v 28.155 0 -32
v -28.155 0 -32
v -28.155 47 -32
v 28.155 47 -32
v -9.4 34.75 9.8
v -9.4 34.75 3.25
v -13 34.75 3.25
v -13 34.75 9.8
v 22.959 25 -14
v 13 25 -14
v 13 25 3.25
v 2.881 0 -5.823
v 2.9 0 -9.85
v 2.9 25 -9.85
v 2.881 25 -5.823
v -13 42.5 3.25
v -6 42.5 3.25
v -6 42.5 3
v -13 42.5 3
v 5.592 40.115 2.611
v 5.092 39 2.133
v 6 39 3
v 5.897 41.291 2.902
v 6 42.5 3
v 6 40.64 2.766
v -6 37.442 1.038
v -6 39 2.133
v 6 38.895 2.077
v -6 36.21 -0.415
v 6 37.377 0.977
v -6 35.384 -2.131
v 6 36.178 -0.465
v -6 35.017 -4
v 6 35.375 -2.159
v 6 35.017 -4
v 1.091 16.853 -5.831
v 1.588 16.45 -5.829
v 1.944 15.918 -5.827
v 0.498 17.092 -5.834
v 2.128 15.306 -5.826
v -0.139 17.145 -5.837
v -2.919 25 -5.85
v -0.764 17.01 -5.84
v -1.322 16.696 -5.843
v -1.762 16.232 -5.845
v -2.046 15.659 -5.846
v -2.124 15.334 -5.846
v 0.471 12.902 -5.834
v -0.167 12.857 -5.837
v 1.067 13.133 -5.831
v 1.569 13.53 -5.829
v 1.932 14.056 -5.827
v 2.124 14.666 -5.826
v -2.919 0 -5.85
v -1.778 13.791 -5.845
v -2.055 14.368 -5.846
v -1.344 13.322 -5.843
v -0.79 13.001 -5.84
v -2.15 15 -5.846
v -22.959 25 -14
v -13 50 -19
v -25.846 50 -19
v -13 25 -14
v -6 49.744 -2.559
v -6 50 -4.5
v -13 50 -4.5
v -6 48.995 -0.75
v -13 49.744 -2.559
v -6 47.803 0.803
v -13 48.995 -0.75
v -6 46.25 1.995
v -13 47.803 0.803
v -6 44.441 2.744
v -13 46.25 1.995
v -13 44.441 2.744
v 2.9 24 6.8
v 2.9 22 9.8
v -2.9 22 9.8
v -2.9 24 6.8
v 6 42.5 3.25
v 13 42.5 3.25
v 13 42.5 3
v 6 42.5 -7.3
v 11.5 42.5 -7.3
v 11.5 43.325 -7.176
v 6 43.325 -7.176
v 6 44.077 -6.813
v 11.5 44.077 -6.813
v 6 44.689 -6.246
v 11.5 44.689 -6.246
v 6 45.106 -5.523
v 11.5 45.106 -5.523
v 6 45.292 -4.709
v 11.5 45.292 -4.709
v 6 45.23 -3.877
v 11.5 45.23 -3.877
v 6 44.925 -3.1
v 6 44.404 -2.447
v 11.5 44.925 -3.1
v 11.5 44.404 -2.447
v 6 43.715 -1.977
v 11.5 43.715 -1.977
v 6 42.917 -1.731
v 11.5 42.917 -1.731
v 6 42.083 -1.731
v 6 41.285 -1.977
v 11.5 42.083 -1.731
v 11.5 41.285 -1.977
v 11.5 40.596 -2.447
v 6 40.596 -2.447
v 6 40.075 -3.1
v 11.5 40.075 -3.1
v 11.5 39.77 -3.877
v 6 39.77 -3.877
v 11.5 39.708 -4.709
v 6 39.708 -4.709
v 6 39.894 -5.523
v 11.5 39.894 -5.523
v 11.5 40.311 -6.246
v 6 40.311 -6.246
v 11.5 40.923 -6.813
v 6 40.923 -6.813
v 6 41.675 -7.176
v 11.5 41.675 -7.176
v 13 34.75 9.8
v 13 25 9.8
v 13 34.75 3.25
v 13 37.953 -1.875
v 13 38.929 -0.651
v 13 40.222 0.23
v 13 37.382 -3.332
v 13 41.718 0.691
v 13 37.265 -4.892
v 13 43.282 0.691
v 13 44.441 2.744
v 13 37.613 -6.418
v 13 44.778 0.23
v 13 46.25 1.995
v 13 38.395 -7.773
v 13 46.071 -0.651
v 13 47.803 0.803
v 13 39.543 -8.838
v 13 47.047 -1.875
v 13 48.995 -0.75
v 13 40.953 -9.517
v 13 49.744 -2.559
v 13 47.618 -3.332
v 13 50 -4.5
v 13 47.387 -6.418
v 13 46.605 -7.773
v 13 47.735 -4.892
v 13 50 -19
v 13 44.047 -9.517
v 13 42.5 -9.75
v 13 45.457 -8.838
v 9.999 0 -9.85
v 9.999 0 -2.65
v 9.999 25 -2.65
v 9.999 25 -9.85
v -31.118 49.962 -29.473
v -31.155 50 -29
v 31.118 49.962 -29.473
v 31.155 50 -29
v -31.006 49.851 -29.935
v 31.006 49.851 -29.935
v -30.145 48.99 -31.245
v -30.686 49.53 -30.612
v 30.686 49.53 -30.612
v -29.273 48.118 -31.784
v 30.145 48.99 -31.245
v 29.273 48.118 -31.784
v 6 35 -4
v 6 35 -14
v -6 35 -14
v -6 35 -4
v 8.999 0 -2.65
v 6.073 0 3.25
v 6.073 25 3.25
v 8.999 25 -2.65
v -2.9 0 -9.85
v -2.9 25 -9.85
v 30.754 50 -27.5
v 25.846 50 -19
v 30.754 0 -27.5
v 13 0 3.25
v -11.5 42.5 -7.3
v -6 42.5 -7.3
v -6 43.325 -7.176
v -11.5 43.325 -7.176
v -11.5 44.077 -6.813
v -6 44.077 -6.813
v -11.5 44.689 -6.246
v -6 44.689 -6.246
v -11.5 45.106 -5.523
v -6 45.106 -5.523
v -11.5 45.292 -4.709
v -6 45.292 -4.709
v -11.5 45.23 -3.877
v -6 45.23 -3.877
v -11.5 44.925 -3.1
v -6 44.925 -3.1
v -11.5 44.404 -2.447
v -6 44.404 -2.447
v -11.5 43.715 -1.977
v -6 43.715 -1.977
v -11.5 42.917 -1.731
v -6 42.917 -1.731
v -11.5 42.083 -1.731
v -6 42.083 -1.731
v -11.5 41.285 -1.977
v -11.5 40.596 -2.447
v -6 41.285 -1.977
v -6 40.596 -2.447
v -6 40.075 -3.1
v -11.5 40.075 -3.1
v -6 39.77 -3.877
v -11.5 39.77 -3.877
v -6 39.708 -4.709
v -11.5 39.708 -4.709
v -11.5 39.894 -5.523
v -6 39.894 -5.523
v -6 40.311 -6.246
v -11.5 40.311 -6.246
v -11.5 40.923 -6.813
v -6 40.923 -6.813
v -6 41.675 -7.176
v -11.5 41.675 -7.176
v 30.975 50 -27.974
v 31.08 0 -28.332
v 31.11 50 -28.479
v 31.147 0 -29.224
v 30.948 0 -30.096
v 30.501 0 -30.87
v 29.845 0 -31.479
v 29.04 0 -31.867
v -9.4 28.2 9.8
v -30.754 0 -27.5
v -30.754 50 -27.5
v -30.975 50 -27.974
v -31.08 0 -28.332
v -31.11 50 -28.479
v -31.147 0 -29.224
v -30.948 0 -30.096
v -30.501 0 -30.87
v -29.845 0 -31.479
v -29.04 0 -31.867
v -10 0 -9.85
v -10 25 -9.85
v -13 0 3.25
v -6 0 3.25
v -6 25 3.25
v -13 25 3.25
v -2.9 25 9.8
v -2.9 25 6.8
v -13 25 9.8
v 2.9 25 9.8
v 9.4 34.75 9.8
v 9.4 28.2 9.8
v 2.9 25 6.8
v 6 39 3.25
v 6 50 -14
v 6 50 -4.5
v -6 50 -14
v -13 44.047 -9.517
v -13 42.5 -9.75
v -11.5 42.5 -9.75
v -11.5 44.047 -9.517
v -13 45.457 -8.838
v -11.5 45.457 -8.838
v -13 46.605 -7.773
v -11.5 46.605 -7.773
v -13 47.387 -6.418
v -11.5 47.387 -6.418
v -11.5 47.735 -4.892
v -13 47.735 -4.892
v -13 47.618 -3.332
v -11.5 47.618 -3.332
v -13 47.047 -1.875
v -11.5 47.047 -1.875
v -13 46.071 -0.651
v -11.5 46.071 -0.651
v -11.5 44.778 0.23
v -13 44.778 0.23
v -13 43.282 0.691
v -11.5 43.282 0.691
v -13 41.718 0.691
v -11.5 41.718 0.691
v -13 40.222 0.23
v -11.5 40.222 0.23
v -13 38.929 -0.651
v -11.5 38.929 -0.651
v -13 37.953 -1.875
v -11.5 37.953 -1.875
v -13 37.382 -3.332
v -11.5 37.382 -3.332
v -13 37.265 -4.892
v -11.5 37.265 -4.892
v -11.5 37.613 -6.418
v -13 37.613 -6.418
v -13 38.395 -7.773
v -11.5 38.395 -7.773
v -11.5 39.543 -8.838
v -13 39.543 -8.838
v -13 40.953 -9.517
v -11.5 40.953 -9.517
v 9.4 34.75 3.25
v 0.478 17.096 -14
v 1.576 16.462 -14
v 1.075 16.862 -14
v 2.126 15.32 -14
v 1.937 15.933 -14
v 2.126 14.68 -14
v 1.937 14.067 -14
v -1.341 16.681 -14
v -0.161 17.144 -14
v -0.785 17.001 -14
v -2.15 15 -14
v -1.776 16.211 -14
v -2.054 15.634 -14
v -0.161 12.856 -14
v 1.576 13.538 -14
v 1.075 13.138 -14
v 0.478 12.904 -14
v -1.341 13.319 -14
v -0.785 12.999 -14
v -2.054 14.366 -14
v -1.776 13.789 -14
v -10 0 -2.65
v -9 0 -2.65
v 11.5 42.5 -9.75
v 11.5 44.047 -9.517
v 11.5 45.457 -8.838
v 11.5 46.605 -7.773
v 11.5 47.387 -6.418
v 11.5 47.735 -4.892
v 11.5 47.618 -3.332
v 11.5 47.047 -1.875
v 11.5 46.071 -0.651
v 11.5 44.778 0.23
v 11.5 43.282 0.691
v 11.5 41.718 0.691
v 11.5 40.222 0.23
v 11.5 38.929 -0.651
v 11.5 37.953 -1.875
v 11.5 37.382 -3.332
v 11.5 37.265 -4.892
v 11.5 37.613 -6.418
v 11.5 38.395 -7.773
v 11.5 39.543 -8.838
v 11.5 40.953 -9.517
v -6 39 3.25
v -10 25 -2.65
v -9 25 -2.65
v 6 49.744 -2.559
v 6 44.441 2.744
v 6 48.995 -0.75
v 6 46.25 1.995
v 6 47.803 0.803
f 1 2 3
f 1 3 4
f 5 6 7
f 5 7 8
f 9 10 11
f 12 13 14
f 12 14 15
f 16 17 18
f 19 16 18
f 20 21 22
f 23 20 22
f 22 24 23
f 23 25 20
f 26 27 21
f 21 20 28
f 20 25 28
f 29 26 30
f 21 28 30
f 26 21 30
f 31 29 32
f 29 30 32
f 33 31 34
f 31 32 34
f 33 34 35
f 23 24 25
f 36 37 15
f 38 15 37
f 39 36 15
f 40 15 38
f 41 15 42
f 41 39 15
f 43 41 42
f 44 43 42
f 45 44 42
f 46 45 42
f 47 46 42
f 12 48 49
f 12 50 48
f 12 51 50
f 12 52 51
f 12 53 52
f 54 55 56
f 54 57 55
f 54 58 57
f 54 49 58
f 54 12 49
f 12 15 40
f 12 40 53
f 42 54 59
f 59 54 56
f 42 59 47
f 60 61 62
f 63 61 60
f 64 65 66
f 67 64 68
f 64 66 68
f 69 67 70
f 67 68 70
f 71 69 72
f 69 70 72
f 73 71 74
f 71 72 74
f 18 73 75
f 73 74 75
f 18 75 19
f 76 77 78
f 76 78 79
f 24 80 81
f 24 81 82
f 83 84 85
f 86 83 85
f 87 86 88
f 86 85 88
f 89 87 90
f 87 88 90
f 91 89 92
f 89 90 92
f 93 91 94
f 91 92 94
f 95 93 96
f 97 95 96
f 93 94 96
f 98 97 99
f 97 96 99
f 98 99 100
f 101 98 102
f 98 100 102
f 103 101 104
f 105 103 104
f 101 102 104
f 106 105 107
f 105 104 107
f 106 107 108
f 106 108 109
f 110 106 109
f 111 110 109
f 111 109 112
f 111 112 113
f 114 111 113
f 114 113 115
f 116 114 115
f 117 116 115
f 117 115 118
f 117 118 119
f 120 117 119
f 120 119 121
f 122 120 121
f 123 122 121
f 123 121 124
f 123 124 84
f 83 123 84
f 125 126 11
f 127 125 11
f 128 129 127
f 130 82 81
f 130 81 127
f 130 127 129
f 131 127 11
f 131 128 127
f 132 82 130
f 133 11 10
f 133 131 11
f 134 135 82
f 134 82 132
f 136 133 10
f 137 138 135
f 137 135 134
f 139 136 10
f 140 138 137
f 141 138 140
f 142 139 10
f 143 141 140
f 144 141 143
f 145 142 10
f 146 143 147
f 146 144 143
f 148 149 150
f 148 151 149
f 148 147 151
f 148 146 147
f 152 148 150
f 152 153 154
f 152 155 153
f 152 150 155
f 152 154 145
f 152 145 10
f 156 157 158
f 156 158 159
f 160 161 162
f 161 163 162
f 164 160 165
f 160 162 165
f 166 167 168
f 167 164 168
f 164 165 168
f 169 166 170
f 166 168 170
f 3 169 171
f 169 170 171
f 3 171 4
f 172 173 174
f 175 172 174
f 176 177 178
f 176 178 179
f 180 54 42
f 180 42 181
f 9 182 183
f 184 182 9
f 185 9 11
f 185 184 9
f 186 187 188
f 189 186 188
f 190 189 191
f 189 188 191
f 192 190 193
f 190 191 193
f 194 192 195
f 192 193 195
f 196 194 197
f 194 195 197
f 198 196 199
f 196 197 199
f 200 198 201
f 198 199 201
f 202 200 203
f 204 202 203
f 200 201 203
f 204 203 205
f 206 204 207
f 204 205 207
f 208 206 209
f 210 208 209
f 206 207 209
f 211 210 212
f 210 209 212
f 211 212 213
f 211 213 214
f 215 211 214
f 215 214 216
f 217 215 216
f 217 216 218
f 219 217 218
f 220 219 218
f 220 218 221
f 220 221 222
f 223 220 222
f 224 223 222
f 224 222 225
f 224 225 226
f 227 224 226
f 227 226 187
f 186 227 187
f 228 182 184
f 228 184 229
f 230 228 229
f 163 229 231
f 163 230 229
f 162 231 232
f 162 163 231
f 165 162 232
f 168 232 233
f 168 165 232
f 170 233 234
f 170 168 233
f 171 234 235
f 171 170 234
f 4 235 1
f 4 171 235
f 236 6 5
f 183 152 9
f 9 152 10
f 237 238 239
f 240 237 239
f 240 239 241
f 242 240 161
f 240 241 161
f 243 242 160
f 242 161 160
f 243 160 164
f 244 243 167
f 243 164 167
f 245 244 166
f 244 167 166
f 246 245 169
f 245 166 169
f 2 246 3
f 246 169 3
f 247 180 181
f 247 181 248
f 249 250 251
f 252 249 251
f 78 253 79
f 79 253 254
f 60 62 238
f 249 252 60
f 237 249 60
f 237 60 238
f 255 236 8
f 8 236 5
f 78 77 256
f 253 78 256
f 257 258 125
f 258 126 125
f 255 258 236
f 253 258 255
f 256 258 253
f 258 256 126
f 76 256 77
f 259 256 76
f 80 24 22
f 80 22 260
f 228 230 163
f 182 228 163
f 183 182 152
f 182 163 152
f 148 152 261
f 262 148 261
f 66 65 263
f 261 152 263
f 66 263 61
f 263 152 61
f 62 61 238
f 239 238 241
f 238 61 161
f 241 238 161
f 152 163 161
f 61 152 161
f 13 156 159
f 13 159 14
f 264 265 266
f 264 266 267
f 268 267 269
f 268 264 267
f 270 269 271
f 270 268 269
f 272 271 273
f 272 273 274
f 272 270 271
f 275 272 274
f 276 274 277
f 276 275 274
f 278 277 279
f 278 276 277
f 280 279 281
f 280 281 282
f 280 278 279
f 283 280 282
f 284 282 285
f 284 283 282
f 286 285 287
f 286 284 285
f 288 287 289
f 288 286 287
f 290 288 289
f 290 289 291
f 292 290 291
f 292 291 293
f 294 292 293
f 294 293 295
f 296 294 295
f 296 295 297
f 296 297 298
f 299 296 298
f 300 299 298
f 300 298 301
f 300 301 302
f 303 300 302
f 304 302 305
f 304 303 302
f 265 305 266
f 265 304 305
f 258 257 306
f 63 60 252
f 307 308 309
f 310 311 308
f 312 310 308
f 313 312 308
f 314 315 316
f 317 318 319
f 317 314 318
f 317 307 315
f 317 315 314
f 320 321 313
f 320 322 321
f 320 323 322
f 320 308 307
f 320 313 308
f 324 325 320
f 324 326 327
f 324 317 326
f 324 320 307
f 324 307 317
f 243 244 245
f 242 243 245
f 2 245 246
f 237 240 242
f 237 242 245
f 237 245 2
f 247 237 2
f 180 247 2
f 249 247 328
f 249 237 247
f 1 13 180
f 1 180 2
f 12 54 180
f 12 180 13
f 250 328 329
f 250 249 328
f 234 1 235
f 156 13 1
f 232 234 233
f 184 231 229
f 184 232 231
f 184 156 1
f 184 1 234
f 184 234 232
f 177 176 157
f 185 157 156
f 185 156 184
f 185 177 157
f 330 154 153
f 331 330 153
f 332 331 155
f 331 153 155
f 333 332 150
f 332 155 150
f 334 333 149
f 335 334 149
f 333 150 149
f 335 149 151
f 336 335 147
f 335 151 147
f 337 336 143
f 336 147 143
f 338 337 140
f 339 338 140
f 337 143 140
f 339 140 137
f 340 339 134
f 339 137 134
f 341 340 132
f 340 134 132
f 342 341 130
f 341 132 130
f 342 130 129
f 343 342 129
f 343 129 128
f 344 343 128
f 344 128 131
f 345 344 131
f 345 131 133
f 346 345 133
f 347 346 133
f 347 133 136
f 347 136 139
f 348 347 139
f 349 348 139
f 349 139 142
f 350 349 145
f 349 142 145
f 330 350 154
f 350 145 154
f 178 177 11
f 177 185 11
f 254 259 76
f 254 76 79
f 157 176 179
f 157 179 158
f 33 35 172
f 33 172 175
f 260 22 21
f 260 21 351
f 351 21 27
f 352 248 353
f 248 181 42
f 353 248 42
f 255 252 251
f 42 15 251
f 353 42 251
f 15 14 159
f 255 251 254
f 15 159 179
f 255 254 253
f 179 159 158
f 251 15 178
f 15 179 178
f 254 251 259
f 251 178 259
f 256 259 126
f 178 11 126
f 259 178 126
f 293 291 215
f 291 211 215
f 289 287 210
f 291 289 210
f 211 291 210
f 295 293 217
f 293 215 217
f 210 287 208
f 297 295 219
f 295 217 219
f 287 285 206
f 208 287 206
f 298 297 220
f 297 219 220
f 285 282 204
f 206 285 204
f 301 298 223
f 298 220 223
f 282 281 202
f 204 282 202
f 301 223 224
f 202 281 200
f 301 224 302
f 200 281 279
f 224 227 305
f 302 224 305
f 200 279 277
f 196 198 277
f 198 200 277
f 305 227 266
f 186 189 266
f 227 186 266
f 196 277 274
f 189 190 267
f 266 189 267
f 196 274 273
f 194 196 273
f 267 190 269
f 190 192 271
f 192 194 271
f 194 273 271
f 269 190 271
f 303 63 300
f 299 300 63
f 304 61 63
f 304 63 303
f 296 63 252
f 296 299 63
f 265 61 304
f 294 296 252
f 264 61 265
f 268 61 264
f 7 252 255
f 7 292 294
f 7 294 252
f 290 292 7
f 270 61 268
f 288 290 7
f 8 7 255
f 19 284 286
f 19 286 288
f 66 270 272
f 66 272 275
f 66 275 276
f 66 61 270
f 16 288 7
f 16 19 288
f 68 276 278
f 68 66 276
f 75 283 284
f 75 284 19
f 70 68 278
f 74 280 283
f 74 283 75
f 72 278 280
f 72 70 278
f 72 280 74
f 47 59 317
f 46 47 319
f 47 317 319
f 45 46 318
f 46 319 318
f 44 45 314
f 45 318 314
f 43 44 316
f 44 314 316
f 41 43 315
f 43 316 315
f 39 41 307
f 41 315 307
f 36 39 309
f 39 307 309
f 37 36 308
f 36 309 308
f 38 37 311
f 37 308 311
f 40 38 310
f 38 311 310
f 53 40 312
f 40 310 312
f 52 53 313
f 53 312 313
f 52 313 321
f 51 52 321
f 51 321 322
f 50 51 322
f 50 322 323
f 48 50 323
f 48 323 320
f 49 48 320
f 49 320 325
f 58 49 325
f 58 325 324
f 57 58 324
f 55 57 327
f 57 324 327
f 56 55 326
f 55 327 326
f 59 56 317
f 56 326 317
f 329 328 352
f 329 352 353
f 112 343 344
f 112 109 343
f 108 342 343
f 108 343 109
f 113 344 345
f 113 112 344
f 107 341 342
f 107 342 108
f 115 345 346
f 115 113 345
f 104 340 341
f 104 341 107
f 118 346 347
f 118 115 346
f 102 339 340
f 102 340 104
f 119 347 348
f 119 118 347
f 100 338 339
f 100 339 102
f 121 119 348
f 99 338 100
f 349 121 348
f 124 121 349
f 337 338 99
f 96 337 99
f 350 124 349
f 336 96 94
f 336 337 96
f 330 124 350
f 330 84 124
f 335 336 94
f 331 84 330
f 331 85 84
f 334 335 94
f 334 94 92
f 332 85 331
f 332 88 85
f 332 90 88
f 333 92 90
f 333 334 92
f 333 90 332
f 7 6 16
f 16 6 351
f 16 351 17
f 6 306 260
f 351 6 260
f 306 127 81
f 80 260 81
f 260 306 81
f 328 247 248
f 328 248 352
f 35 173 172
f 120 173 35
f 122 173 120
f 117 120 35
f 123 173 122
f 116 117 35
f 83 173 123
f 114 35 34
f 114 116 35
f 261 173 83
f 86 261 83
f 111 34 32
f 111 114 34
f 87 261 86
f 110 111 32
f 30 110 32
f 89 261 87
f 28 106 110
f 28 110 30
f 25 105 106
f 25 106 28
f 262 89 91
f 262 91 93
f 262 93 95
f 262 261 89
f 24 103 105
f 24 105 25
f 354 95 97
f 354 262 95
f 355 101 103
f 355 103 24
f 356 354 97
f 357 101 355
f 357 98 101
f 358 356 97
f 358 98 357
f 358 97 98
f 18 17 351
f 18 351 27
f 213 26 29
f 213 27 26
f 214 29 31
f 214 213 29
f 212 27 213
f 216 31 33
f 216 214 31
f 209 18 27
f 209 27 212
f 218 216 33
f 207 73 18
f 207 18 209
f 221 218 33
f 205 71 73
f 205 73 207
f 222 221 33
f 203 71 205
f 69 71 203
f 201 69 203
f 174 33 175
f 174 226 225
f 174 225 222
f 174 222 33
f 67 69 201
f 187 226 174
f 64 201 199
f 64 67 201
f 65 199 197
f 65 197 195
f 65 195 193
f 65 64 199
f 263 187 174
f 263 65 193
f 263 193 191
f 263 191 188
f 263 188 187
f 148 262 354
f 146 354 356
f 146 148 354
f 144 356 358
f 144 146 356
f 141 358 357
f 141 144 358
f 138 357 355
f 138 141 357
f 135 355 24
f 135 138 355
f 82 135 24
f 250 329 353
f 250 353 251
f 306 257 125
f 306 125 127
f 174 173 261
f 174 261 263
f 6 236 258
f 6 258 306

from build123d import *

# Parameters (mm, degrees)
BOSS_EXTRUDE1_DEPTH     = 50
CUT_EXTRUDE6_DEPTH      = 25
CUT_EXTRUDE3_DEPTH      = 39.00000000000001
SKETCH14_R              = 7.5000000000001545
BOSS_EXTRUDE7_DEPTH     = 7
SKETCH15_R              = 2.800000000000002
CUT_EXTRUDE4_DEPTH      = 27.999999999999996
SKETCH16_R              = 5.249999999999997
CUT_EXTRUDE5_DEPTH      = 1.5
CUT_EXTRUDE7_DEPTH      = 54.52569476429079
SKETCH19_R              = 2.1499999999999995
CUT_EXTRUDE9_DEPTH      = 50
ENL_V_MAT_EXTRU_1_DEPTH = 7.5
ENL_V_MAT_EXTRU_3_DEPTH = 10
BOSS_EXTRU_1_DEPTH      = 26.00000000000001
ENL_V_MAT_EXTRU_5_DEPTH = 3.5
BOSS_EXTRU_3_DEPTH      = 1
BOSS_EXTRU_4_START      = -5.8
BOSS_EXTRU_4_DEPTH      = 5.8
BOSS_EXTRU_5_DEPTH      = 0.1
BOSS_EXTRU_6_DEPTH      = 0.1
ESQUISSE13_W            = 6.549999999999918
ESQUISSE13_H            = 9.750000000000139
BOSS_EXTRU_7_DEPTH      = 3.6
ESQUISSE14_W            = 6.549999999999992
ESQUISSE14_H            = 9.750000000000139
BOSS_EXTRU_8_DEPTH      = 3.6
BOSS_EXTRU_11_DEPTH     = 25
BOSS_EXTRU_12_DEPTH     = 25
ENL_V_MAT_EXTRU_6_DEPTH = 28.00000000000001
CONG_1_R                = 3


with BuildPart() as part:
    # Sketch1 → Boss-Extrude1 (new body)
    with BuildSketch(Plane(origin=(0, 0, 0), x_dir=(1, 0, 0), z_dir=(0, 1, 0))):
        Polygon((-13.000000000000004, 14), (12.999999999999996, 14), (13.000000000000002, -14), (-12.999999999999998, -14), align=None)
    extrude(amount=BOSS_EXTRUDE1_DEPTH)

    # Sketch3 → Cut-Extrude6 (cut)
    with BuildSketch(Plane(origin=(0, 0, 0), x_dir=(1, 0, 0), z_dir=(0, 1, 0))):
        Polygon((9.998973293230602, 2.6500000000000012), (9.9989732932306, 9.850000000000001), (2.9002540058261537, 9.850000000000001), (2.881158297661572, 5.82281627717582), (-2.9187777922427904, 5.850044075927868), (-2.8999999999999972, 9.850000000000001), (-9.999999999999996, 9.85), (-9.999999999999995, 2.6499999999999995), (-8.99999999999974, 2.6499999999999995), (-6.00000000000001, -3.2500000000000027), (-9.999999999999998, -3.2500000000000027), (-9.999999999999993, -4.349999999999079), (-9.99999999999999, -15.089504782389637), (10.190019105374848, -15.102048820223754), (10.123266065424222, -8.899331206040385), (10.06892160658641, -3.849623622447693), (10.062468515842252, -3.2500000000000027), (6.072889948170096, -3.2500000000000027), (8.998973293230604, 2.6500000000000017), align=None)
    extrude(amount=CUT_EXTRUDE6_DEPTH, mode=Mode.SUBTRACT)

    # Sketch7 → Cut-Extrude3 (cut)
    with BuildSketch(Plane(origin=(13, 0, -2.42e-15), x_dir=(-1.3e-16, 0, -1), z_dir=(1, 0, -1.3e-16))):
        with BuildLine():
            Line((4.499999999999999, 50), (-14.000000000000002, 50))
            Line((-14.000000000000002, 50), (-14.000000000000002, 24.000000000000004))
            Line((-14.000000000000002, 24.000000000000004), (-0.8033008588991847, 37.19669914110098))
            ThreePointArc((-0.8033008588991847, 37.19669914110098), (11.429096493834622, 39.629874257261775), (4.499999999999999, 50))
        make_face()
    extrude(amount=-CUT_EXTRUDE3_DEPTH, mode=Mode.SUBTRACT)

    # Sketch14 → Boss-Extrude7 (add)
    with BuildSketch(Plane(origin=(13, 0, -2.42e-15), x_dir=(-1.3e-16, 0, -1), z_dir=(1, 0, -1.3e-16))):
        with Locations((4.499999999999999, 42.500000000000114)):
            Circle(SKETCH14_R)
    boss_extrude7 = extrude(amount=-BOSS_EXTRUDE7_DEPTH)

    # Symétrie1: Boss-Extrude7 across plane
    add(boss_extrude7.mirror(Plane(origin=(0, 0, 0), x_dir=(0, 0, 1), z_dir=(1, 0, 0))))

    # Sketch15 → Cut-Extrude4 (cut)
    with BuildSketch(Plane(origin=(13, 0, -2.42e-15), x_dir=(-1.3e-16, 0, -1), z_dir=(1, 0, -1.3e-16))):
        with Locations((4.499999999999999, 42.50000000000027)):
            Circle(SKETCH15_R)
    extrude(amount=-CUT_EXTRUDE4_DEPTH, mode=Mode.SUBTRACT)

    # Sketch16 → Cut-Extrude5 (cut)
    with BuildSketch(Plane(origin=(13, 0, -2.42e-15), x_dir=(-1.3e-16, 0, -1), z_dir=(1, 0, -1.3e-16))):
        with Locations((4.499999999999999, 42.50000000000027)):
            Circle(SKETCH16_R)
    cut_extrude5 = extrude(amount=-CUT_EXTRUDE5_DEPTH, mode=Mode.SUBTRACT)

    # Mirror3: Cut-Extrude5 across plane
    add(cut_extrude5.mirror(Plane(origin=(0, 0, 0), x_dir=(0, 0, 1), z_dir=(1, 0, 0))), mode=Mode.SUBTRACT)

    # Sketch17 → Cut-Extrude7 (cut, through all)
    with BuildSketch(Plane.XZ):
        Polygon((-9.29999999999996, 3.250000000000054), (-13.000000000000009, 3.2500000000000546), (-12.999999999999998, 14), (13.000000000000002, 14), (12.99999999999999, 3.2500000000000546), (9.300000000000033, 3.2499999999999205), (9.300000000000033, 9.79999999999992), (-9.29999999999996, 9.80000000000005), align=None)
    extrude(amount=-CUT_EXTRUDE7_DEPTH, mode=Mode.SUBTRACT)

    # Sketch19 → Cut-Extrude9 (cut)
    with BuildSketch(Plane(origin=(0, 0, -14), x_dir=(-1, 0, 0), z_dir=(0, 0, -1))):
        with Locations((0, 15)):
            Circle(SKETCH19_R)
    extrude(amount=-CUT_EXTRUDE9_DEPTH, mode=Mode.SUBTRACT)

    # Esquisse1 → Enlèv. mat.-Extru.1 (cut)
    with BuildSketch(Plane(origin=(0, 50, 0), x_dir=(1, 0, 0), z_dir=(0, 1, 0))):
        Polygon((5.999999999999998, 4.500000000000001), (-6.000000000000002, 4.499999999999999), (-6, 14), (5.999999999999998, 14), align=None)
    extrude(amount=-ENL_V_MAT_EXTRU_1_DEPTH, mode=Mode.SUBTRACT)

    # Esquisse3 → Enlèv. mat.-Extru.3 (cut)
    with BuildSketch(Plane(origin=(0, 0, -14), x_dir=(-1, 0, 0), z_dir=(0, 0, -1))):
        Polygon((6, 42.5), (-6, 42.5), (-5.999999999999999, 35), (6.000000000000001, 35), align=None)
    extrude(amount=-ENL_V_MAT_EXTRU_3_DEPTH, mode=Mode.SUBTRACT)

    # Esquisse6 → Boss.-Extru.1 (add)
    with BuildSketch(Plane(origin=(13, 0, -2.42e-15), x_dir=(-1.9e-16, 0, -1), z_dir=(1, 0, -1.9e-16))):
        with BuildLine():
            Line((-3.2500000000000573, 34.75000000000014), (-3.2500000000000573, 42.50000000000006))
            Line((-3.2500000000000573, 42.50000000000006), (-3.0000000000000226, 42.50000000000006))
            ThreePointArc((-3.0000000000000226, 42.50000000000006), (-2.4290964938347503, 39.629874257261875), (-0.8033008588992404, 37.19669914110092))
            Line((-0.8033008588992404, 37.19669914110092), (-3.2500000000000573, 34.75000000000014))
        make_face()
    extrude(amount=-BOSS_EXTRU_1_DEPTH)

    # Esquisse7 → Enlèv. mat.-Extru.5 (cut)
    with BuildSketch(Plane(origin=(0, 42.50000000000006, 0), x_dir=(1, 0, 0), z_dir=(0, 1, 0))):
        Polygon((5.999999999999993, -3.0000000000000213), (5.999999999999993, -7.096354864410982), (-6.000000000000002, -3.7800697907913037), (-6.000000000000002, 8.456914552722129), align=None)
    extrude(amount=-ENL_V_MAT_EXTRU_5_DEPTH, mode=Mode.SUBTRACT)

    # Esquisse9 → Boss.-Extru.3 (add)
    with BuildSketch(Plane(origin=(0, 25, 0), x_dir=(-1, 0, 0), z_dir=(0, -1, 0))):
        Polygon((2.899999999999959, -9.80000000000005), (-2.9000000000000408, -9.80000000000005), (-2.9000000000000408, -6.8000000000000504), (2.899999999999959, -6.80000000000005), align=None)
    extrude(amount=BOSS_EXTRU_3_DEPTH)

    # Esquisse10 → Boss.-Extru.4 (add)
    with BuildSketch(Plane.ZY.offset(2.899999999999959).offset(BOSS_EXTRU_4_START)):
        Polygon((9.80000000000005, 24), (9.80000000000005, 22), (6.80000000000005, 24), align=None)
    extrude(amount=BOSS_EXTRU_4_DEPTH)

    # Esquisse11 → Boss.-Extru.5 (add)
    with BuildSketch(Plane.ZY.offset(9.29999999999996)):
        Polygon((3.2500000000000586, 34.75000000000014), (9.80000000000005, 28.20000000000007), (9.80000000000005, 25), (3.2500000000000586, 25), align=None)
    extrude(amount=BOSS_EXTRU_5_DEPTH)

    # Esquisse12 → Boss.-Extru.6 (add)
    with BuildSketch(Plane(origin=(9.300000000000033, 0, 0), x_dir=(0, 0, -1), z_dir=(1, 0, 0))):
        Polygon((-9.79999999999992, 25), (-9.799999999999923, 28.20000000000013), (-3.250000000000055, 34.75000000000014), (-3.2499999999999205, 25), align=None)
    extrude(amount=BOSS_EXTRU_6_DEPTH)

    # Esquisse13 → Boss.-Extru.7 (add)
    with BuildSketch(Plane(origin=(9.400000000000032, 0, 0), x_dir=(0, 0, -1), z_dir=(1, 0, 0))):
        with Locations((-6.524999999999961, 29.87500000000007)):
            Rectangle(ESQUISSE13_W, ESQUISSE13_H)
    extrude(amount=BOSS_EXTRU_7_DEPTH)

    # Esquisse14 → Boss.-Extru.8 (add)
    with BuildSketch(Plane.ZY.offset(9.39999999999996)):
        with Locations((6.5250000000000545, 29.87500000000007)):
            Rectangle(ESQUISSE14_W, ESQUISSE14_H)
    extrude(amount=BOSS_EXTRU_8_DEPTH)

    # Esquisse18 → Boss.-Extru.11 (add)
    with BuildSketch(Plane.XZ):
        Polygon((-13.000000000000009, 3.2500000000000524), (-33.35159698893457, -32), (33.35159698893456, -32), (12.99999999999999, 3.2500000000000546), (12.999999999999996, -14), (-13.000000000000004, -14), align=None)
    extrude(amount=-BOSS_EXTRU_11_DEPTH)

    # Esquisse19 → Boss.-Extru.12 (add)
    with BuildSketch(Plane(origin=(0, 25, 0), x_dir=(1, 0, 0), z_dir=(0, 1, 0))):
        Polygon((33.35159698893456, 32), (22.959292143521182, 14.000000000000002), (-22.95929214352119, 14), (-33.35159698893457, 32), align=None)
    extrude(amount=BOSS_EXTRU_12_DEPTH)

    # Esquisse20 → Enlèv. mat.-Extru.6 (cut)
    with BuildSketch(Plane(origin=(13, 0, -2.42e-15), x_dir=(-1.9e-16, 0, -1), z_dir=(1, 0, -1.9e-16))):
        Polygon((14, 25), (14, 50), (19, 50), align=None)
    enl_v_mat_extru_6 = extrude(amount=ENL_V_MAT_EXTRU_6_DEPTH, mode=Mode.SUBTRACT)

    # Symétrie3: Enlèv. mat.-Extru.6 across plane
    add(enl_v_mat_extru_6.mirror(Plane(origin=(0, 0, 0), x_dir=(0, 0, 1), z_dir=(1, 0, 0))), mode=Mode.SUBTRACT)

    # Congé1
    cong_1_edges = [part.edges().sort_by_distance(p)[0] for p in [
        (33.35159698893456, 25, -32),
        (-33.35159698893457, 25, -32),
        (-7.11e-15, 50, -32),
    ]]
    fillet(cong_1_edges, radius=CONG_1_R)


solid = part.part
